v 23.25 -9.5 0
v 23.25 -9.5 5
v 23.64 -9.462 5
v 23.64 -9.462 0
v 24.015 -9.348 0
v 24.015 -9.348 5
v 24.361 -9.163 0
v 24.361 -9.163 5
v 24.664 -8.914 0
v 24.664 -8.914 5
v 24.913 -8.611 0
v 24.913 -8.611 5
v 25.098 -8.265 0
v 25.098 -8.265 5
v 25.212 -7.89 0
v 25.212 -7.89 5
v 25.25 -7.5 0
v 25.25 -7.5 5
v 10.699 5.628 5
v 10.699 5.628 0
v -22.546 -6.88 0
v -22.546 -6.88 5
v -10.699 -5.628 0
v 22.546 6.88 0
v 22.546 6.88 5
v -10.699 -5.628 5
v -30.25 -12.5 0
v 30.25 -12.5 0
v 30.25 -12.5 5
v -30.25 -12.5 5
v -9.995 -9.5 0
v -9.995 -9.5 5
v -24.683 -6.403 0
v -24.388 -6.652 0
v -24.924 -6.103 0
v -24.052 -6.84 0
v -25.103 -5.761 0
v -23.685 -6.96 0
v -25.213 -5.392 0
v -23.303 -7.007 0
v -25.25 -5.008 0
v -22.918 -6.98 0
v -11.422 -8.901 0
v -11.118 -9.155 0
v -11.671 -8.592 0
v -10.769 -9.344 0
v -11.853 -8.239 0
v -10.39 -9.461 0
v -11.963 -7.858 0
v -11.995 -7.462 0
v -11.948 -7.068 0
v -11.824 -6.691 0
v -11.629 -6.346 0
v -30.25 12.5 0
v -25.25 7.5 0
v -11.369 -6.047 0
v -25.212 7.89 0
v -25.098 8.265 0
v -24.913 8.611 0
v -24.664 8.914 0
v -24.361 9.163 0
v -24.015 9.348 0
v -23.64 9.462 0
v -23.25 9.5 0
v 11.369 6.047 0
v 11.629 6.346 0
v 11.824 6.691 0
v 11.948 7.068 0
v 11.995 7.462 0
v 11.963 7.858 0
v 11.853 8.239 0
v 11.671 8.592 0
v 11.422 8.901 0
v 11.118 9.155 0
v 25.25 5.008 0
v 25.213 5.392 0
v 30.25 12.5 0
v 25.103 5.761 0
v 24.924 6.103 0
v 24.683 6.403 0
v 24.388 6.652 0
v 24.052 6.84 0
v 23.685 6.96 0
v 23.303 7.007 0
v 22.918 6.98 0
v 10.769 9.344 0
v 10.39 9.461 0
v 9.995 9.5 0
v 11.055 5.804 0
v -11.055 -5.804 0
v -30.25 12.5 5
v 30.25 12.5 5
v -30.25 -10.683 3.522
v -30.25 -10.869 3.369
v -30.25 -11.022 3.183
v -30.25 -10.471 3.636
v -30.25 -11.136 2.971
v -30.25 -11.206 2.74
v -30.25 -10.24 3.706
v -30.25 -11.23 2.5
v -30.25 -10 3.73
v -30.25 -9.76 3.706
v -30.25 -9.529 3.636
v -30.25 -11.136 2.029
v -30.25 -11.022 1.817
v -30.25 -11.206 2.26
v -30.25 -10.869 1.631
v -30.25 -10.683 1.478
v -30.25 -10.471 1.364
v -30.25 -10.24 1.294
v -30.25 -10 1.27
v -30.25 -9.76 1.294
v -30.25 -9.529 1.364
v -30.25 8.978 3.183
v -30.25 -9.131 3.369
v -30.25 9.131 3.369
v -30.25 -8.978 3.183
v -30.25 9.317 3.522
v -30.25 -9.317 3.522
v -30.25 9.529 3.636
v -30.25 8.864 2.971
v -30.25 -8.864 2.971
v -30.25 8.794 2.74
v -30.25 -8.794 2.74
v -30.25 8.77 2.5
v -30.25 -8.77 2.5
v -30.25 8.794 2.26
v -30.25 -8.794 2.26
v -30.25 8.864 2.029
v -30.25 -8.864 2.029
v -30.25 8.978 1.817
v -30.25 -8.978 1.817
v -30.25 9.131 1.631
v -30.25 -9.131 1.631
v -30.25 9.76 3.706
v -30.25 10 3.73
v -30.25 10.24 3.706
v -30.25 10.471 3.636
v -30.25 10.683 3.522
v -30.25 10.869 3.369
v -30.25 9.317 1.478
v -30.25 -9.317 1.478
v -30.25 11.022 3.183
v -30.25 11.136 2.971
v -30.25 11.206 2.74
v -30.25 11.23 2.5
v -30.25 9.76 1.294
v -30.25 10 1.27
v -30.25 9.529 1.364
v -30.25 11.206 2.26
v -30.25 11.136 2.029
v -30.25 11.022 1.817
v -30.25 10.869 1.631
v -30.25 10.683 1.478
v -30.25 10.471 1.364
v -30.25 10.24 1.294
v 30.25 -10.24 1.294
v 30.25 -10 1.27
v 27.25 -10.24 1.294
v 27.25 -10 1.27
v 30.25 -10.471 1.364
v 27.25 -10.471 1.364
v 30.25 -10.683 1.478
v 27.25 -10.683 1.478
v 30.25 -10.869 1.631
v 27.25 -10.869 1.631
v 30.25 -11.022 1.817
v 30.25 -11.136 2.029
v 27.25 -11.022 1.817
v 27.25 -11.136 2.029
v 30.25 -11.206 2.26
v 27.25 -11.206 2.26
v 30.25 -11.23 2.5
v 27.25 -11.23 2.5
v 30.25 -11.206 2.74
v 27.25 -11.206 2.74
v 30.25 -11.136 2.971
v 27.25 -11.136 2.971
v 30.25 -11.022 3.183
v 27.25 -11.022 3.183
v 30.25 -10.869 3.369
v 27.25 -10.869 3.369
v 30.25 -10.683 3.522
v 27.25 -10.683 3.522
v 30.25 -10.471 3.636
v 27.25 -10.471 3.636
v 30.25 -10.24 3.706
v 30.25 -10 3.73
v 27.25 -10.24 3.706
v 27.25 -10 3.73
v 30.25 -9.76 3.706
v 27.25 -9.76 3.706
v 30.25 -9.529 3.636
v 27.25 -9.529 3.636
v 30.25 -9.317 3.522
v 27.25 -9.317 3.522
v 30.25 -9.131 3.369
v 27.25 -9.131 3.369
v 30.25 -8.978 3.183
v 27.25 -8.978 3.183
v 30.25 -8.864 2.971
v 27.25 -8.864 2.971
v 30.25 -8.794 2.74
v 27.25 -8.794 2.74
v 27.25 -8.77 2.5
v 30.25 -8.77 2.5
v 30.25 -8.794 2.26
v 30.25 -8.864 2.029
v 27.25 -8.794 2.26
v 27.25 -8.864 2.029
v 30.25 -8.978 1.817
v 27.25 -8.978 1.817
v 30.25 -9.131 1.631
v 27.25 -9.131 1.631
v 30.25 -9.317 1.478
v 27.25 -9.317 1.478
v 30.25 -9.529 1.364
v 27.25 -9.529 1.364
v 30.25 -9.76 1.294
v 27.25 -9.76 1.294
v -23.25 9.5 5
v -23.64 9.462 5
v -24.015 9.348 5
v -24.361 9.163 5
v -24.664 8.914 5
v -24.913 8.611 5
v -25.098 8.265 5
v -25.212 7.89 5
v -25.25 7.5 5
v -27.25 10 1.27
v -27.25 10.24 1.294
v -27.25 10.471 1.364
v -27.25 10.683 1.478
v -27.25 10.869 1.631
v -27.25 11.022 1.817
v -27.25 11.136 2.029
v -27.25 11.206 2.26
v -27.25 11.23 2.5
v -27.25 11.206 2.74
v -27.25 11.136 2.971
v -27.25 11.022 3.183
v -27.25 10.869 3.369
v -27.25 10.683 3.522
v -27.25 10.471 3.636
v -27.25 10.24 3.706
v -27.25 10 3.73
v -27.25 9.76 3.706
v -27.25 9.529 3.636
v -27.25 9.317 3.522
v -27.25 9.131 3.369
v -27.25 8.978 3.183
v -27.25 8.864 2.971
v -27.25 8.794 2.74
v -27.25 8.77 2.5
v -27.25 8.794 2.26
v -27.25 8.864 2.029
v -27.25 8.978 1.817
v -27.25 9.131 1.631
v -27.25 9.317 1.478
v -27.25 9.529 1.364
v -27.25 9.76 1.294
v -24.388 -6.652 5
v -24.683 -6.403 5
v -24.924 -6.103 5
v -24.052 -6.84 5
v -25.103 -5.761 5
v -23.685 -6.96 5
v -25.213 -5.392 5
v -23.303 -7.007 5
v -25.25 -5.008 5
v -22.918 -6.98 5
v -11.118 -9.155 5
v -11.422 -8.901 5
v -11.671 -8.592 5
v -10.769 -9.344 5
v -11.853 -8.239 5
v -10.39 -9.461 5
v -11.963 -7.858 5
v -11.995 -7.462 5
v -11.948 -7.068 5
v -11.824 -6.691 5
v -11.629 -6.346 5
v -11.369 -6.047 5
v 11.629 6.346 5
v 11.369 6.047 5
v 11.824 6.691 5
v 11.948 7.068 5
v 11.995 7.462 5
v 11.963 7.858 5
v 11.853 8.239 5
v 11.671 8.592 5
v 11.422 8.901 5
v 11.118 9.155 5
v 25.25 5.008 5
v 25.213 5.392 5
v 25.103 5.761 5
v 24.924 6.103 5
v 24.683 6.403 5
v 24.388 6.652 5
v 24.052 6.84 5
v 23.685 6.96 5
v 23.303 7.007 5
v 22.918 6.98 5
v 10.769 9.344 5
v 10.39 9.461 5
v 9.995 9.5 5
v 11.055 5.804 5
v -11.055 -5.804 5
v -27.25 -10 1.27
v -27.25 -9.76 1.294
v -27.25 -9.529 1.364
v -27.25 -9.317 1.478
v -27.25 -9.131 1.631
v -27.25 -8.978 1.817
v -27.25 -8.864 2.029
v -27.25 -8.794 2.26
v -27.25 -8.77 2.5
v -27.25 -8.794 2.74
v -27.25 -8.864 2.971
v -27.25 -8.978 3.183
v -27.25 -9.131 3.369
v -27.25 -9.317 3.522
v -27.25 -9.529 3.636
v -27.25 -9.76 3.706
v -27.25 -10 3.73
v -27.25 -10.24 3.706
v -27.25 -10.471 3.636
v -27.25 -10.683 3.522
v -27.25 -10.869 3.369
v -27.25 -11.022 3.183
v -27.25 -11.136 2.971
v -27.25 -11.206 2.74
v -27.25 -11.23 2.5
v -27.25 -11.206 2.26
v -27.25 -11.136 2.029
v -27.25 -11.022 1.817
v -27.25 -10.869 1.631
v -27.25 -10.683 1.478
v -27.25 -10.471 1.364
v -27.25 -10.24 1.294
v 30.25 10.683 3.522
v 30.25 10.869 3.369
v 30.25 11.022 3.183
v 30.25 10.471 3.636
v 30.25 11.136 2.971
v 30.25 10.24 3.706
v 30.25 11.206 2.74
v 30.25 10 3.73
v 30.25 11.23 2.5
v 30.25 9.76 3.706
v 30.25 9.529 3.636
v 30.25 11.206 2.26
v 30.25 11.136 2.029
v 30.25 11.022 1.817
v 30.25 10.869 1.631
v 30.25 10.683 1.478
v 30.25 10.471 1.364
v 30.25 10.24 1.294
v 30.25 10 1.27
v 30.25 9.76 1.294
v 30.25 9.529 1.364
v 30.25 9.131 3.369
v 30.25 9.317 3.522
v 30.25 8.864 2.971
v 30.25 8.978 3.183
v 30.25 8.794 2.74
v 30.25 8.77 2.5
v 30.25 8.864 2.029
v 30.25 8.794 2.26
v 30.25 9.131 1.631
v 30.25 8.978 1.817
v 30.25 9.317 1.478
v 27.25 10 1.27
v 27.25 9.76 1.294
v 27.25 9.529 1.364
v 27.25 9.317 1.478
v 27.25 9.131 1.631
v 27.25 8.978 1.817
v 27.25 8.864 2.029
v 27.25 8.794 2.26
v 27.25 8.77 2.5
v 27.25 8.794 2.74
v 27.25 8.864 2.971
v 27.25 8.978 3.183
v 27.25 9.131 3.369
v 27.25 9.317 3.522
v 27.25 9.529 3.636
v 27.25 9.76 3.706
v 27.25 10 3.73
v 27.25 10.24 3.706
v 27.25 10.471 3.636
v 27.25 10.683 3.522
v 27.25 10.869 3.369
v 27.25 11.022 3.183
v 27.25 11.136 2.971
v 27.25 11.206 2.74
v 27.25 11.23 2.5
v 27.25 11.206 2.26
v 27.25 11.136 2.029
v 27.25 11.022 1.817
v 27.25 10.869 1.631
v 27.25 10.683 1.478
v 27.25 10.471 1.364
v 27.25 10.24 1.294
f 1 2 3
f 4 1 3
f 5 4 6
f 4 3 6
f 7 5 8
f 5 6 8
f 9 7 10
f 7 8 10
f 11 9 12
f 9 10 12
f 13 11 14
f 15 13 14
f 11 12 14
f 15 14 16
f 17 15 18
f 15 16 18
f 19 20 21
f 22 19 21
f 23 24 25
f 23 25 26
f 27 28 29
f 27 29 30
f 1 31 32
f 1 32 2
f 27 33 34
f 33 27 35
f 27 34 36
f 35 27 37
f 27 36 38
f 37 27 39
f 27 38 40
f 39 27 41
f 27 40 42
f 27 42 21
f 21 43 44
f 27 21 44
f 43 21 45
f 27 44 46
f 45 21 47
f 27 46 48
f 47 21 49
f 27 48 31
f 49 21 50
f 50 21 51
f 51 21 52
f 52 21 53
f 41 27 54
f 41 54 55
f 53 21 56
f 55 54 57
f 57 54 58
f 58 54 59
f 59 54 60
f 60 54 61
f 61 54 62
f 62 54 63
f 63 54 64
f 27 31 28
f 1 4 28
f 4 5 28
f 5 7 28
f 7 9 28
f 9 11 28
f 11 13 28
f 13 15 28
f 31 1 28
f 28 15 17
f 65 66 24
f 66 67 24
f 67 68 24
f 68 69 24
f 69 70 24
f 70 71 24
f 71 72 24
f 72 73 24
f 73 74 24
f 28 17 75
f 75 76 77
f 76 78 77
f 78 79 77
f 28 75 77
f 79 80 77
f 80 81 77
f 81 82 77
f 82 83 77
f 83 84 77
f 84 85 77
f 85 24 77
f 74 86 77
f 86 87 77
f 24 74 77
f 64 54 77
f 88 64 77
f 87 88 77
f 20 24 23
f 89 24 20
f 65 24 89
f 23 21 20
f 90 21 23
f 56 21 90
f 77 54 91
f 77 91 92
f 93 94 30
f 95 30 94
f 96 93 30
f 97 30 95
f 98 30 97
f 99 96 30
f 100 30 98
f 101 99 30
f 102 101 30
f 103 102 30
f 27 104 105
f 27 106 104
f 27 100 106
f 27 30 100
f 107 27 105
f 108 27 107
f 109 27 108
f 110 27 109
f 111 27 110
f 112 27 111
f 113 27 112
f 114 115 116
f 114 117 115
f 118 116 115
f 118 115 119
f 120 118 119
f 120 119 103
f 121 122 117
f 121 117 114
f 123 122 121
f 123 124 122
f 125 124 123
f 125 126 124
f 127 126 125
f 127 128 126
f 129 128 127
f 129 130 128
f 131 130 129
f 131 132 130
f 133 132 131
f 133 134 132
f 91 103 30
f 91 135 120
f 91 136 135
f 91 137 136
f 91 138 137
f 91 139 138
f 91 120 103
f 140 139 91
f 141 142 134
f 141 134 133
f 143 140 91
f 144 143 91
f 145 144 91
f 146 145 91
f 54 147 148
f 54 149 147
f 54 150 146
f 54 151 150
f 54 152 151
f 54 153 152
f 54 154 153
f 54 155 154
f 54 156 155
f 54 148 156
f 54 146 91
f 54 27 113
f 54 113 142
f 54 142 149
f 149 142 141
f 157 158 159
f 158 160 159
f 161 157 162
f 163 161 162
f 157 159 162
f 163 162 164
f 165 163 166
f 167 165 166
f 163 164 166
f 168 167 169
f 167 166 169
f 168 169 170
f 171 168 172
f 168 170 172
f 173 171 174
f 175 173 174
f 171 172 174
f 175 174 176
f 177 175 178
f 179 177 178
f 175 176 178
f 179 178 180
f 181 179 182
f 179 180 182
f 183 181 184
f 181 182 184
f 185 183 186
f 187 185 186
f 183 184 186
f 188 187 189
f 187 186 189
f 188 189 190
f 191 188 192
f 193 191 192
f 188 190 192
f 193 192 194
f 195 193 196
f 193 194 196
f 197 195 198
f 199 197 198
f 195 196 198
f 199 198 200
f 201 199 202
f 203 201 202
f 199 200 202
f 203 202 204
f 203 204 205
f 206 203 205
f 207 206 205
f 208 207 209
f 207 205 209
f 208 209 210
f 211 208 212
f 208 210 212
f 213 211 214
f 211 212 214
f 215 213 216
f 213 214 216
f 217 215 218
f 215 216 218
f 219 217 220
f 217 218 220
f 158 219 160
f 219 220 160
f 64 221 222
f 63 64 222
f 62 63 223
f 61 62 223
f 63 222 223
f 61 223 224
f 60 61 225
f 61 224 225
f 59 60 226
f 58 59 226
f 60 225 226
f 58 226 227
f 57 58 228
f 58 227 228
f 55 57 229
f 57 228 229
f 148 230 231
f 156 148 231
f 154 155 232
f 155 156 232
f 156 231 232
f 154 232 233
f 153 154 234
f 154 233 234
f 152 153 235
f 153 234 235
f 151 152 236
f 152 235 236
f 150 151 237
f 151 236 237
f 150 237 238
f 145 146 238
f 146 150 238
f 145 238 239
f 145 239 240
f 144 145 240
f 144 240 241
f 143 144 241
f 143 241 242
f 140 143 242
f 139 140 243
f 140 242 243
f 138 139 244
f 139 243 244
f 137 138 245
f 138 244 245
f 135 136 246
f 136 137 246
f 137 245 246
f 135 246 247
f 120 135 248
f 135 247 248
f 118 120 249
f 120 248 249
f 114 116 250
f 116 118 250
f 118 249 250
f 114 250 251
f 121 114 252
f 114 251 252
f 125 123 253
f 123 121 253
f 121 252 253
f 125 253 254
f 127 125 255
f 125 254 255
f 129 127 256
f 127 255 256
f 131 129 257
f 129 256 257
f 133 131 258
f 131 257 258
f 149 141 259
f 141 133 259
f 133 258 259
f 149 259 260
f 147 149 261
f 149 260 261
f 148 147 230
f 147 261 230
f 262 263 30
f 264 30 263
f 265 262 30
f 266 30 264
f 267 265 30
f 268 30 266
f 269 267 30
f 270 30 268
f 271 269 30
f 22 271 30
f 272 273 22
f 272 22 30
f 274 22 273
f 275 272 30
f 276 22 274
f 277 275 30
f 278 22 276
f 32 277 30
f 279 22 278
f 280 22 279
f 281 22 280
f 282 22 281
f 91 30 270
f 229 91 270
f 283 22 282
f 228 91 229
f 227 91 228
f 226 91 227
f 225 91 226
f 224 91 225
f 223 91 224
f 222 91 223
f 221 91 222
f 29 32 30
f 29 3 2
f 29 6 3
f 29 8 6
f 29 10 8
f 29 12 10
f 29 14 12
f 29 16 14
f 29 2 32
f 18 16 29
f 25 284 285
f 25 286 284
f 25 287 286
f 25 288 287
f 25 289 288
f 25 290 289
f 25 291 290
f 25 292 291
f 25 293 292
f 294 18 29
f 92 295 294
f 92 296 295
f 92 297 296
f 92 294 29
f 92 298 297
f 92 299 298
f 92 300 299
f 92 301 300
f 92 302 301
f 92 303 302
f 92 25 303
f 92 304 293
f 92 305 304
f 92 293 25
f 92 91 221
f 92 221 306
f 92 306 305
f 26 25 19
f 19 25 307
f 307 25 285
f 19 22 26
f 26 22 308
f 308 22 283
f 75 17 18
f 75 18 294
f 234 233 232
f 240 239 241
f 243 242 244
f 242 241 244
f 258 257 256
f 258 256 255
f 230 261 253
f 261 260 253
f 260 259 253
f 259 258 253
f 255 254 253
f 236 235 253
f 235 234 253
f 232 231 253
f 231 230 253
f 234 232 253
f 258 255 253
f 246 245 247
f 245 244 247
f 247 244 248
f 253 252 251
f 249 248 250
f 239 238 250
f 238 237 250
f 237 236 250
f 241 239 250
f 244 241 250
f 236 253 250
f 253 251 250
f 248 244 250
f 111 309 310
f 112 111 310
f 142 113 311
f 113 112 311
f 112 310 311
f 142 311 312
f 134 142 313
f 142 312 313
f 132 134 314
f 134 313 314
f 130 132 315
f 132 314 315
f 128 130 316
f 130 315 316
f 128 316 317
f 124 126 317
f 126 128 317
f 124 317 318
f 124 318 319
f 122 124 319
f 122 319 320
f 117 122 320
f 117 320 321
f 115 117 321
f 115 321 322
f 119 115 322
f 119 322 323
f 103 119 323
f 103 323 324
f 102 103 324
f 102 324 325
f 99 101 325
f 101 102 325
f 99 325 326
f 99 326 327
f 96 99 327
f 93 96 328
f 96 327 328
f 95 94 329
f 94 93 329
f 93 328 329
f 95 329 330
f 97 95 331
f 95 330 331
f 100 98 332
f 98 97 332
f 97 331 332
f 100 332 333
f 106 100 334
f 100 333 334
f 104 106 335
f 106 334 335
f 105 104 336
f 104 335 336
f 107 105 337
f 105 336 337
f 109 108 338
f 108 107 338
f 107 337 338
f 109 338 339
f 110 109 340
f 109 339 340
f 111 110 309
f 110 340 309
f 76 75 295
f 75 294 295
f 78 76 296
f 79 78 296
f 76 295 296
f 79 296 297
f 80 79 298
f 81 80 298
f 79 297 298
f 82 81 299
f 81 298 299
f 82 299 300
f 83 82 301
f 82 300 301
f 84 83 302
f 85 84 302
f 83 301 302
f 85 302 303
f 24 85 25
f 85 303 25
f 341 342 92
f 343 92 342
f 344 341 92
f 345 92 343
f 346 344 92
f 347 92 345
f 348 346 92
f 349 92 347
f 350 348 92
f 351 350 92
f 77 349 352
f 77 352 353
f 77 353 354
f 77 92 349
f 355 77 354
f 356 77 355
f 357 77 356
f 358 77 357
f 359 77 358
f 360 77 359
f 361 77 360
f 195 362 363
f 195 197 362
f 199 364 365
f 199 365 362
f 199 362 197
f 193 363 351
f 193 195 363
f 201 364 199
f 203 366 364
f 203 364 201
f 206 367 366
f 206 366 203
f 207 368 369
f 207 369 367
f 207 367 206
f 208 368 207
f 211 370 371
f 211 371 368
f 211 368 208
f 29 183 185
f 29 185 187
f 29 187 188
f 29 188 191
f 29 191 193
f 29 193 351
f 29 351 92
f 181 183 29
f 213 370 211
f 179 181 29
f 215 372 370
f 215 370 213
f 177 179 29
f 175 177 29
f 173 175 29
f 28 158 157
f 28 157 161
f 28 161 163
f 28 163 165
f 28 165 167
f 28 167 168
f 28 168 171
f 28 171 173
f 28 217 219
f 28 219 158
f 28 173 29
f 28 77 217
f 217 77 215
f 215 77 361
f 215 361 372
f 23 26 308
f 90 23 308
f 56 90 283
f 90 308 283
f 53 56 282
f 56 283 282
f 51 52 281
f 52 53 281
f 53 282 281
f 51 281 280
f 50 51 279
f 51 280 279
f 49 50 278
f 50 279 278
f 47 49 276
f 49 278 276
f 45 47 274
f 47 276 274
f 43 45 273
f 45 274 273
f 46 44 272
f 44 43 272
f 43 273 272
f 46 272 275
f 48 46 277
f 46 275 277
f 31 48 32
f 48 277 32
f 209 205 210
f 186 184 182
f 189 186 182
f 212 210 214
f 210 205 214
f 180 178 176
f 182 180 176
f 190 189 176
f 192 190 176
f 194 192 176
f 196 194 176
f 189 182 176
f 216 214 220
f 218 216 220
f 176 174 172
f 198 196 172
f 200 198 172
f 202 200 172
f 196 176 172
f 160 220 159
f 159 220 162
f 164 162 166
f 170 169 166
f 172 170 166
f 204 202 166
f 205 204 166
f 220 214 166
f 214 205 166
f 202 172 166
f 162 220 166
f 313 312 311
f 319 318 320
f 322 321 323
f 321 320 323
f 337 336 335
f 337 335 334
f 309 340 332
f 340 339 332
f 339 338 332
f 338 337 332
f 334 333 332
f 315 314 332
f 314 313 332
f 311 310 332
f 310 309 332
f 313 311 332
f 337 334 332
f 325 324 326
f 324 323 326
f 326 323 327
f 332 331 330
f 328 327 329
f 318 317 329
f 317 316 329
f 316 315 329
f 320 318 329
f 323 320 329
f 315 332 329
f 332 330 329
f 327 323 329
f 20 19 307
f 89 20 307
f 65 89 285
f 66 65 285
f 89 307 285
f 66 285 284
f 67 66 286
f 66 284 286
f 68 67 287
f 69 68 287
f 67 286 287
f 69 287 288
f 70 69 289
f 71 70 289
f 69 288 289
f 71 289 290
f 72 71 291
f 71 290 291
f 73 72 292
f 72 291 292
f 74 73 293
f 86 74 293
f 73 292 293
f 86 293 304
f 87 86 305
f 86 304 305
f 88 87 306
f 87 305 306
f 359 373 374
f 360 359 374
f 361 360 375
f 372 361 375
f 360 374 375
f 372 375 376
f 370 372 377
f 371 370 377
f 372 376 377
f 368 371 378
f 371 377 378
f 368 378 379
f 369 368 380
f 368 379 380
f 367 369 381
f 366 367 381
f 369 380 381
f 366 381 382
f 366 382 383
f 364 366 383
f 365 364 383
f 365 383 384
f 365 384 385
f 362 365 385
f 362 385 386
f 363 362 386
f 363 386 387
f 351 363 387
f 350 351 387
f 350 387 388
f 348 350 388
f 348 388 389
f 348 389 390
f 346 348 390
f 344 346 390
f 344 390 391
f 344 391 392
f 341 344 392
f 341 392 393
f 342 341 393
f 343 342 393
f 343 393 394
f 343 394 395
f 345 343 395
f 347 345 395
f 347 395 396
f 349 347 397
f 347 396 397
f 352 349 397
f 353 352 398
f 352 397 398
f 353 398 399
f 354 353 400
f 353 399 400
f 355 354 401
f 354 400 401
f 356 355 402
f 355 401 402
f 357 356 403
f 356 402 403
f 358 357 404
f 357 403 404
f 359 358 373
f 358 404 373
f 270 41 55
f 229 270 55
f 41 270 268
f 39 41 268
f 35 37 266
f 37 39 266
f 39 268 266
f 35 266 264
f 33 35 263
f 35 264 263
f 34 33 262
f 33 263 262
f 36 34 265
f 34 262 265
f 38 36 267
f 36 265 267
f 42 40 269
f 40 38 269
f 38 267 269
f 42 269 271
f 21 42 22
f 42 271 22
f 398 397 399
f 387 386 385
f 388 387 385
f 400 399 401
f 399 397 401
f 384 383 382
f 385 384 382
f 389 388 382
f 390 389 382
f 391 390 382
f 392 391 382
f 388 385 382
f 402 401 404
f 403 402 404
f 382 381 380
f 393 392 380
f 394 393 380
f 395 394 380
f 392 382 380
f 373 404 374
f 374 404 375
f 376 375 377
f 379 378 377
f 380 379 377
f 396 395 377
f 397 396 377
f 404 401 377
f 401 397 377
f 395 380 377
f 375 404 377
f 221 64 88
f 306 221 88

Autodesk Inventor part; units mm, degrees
ref_plane "YZ Plane" through (0, 0, 0) normal (1, 0, 0) x (0, 1, 0)
ref_plane "XZ Plane" through (0, 0, 0) normal (0, 1, 0) x (-1, 0, 0)
ref_plane "XY Plane" through (0, 0, 0) normal (0, 0, 1) x (1, 0, 0)
sketch "スケッチ1" plane through (0, 0, 0) normal (0, 0, 1) x (1, 0, 0)
  line L0 (-30.25, 12.5) -> (30.25, 12.5)
  line L1 (30.25, 12.5) -> (30.25, -12.5)
  line L2 (30.25, -12.5) -> (-30.25, -12.5)
  line L3 (-30.25, -12.5) -> (-30.25, 12.5)
  line L4 (-25.25, 9.5) -> (25.25, 9.5) construction
  line L5 (25.25, 9.5) -> (25.25, -9.5) construction
  line L6 (25.25, -9.5) -> (-25.25, -9.5) construction
  line L7 (-25.25, -9.5) -> (-25.25, 9.5) construction
  line L8 (25.25, 9.5) -> (-25.25, -9.5) construction
  line L9 (-25.25, -7.8973) -> (-25.25, 9.5)
  line L10 (-25.25, 9.5) -> (20.9903, 9.5)
  line L11 (20.9903, 9.5) -> (-25.25, -7.8973)
  line L12 (-20.9903, -9.5) -> (25.25, -9.5)
  line L13 (25.25, -9.5) -> (25.25, 7.8973)
  line L14 (25.25, 7.8973) -> (-20.9903, -9.5)
  line L15 (-30.25, 10) -> (30.25, 10) construction
  line L16 (30.25, -10) -> (-30.25, -10) construction
  line L17 (30.25, 10) -> (30.25, -10) construction
  point P0 (0, 0)
  point P1 (0, 9.5)
  point P2 (0, 12.5)
  point P3 (25.25, 0)
  point P4 (30.25, 0)
  dimension "d0" = 5
  dimension "d1" = 3
  dimension "d2" = 1.5
  dimension "d4" = 2.5
  dimension "d16" = 60.5
  dimension "d17" = 25
  dimension "d18" = 20
extrude "押し出し1" add sketch "スケッチ1" along normal blind 5
sketch "スケッチ2" plane through (30.25, -12.5, 0) normal (1, 0, 0) x (0, 0, -1)
  line L0 (0, 25) -> (-5, 25) projected
  line L1 (-5, 0) -> (-5, 25) projected
  line L2 (0, 12.5) -> (-5, 12.5) construction
  point P0 (-2.5, 2.5)
  point P1 (-2.5, 22.5)
  point P2 (-2.5, 25)
  dimension "d7" = 20
hole "穴1" at (30.25, -10, 2.5) at (30.25, 10, 2.5) direction (-1, 0, 0) diameter 2.459 depth 3 thread size "M3x0.5" class "6H" standard "ISO Metric profile"
mirror "ミラー1" about plane through (0, 0, 0) normal (1, 0, 0) of "穴1"
fillet "フィレット1" radius 2 6 edges at (-20.9903, -9.5, 2.5) (-25.25, -7.8973, 2.5) (25.25, 7.8973, 2.5) (25.25, -9.5, 2.5) (-25.25, 9.5, 2.5) (20.9903, 9.5, 2.5)
equation "\"d7\" = d18"
equation "\"d3\" = d5_1"
equation "\"d5_1\" = 24"
properties part number "BackLink_diagonal" material "アルミニウム 2014-T4"
